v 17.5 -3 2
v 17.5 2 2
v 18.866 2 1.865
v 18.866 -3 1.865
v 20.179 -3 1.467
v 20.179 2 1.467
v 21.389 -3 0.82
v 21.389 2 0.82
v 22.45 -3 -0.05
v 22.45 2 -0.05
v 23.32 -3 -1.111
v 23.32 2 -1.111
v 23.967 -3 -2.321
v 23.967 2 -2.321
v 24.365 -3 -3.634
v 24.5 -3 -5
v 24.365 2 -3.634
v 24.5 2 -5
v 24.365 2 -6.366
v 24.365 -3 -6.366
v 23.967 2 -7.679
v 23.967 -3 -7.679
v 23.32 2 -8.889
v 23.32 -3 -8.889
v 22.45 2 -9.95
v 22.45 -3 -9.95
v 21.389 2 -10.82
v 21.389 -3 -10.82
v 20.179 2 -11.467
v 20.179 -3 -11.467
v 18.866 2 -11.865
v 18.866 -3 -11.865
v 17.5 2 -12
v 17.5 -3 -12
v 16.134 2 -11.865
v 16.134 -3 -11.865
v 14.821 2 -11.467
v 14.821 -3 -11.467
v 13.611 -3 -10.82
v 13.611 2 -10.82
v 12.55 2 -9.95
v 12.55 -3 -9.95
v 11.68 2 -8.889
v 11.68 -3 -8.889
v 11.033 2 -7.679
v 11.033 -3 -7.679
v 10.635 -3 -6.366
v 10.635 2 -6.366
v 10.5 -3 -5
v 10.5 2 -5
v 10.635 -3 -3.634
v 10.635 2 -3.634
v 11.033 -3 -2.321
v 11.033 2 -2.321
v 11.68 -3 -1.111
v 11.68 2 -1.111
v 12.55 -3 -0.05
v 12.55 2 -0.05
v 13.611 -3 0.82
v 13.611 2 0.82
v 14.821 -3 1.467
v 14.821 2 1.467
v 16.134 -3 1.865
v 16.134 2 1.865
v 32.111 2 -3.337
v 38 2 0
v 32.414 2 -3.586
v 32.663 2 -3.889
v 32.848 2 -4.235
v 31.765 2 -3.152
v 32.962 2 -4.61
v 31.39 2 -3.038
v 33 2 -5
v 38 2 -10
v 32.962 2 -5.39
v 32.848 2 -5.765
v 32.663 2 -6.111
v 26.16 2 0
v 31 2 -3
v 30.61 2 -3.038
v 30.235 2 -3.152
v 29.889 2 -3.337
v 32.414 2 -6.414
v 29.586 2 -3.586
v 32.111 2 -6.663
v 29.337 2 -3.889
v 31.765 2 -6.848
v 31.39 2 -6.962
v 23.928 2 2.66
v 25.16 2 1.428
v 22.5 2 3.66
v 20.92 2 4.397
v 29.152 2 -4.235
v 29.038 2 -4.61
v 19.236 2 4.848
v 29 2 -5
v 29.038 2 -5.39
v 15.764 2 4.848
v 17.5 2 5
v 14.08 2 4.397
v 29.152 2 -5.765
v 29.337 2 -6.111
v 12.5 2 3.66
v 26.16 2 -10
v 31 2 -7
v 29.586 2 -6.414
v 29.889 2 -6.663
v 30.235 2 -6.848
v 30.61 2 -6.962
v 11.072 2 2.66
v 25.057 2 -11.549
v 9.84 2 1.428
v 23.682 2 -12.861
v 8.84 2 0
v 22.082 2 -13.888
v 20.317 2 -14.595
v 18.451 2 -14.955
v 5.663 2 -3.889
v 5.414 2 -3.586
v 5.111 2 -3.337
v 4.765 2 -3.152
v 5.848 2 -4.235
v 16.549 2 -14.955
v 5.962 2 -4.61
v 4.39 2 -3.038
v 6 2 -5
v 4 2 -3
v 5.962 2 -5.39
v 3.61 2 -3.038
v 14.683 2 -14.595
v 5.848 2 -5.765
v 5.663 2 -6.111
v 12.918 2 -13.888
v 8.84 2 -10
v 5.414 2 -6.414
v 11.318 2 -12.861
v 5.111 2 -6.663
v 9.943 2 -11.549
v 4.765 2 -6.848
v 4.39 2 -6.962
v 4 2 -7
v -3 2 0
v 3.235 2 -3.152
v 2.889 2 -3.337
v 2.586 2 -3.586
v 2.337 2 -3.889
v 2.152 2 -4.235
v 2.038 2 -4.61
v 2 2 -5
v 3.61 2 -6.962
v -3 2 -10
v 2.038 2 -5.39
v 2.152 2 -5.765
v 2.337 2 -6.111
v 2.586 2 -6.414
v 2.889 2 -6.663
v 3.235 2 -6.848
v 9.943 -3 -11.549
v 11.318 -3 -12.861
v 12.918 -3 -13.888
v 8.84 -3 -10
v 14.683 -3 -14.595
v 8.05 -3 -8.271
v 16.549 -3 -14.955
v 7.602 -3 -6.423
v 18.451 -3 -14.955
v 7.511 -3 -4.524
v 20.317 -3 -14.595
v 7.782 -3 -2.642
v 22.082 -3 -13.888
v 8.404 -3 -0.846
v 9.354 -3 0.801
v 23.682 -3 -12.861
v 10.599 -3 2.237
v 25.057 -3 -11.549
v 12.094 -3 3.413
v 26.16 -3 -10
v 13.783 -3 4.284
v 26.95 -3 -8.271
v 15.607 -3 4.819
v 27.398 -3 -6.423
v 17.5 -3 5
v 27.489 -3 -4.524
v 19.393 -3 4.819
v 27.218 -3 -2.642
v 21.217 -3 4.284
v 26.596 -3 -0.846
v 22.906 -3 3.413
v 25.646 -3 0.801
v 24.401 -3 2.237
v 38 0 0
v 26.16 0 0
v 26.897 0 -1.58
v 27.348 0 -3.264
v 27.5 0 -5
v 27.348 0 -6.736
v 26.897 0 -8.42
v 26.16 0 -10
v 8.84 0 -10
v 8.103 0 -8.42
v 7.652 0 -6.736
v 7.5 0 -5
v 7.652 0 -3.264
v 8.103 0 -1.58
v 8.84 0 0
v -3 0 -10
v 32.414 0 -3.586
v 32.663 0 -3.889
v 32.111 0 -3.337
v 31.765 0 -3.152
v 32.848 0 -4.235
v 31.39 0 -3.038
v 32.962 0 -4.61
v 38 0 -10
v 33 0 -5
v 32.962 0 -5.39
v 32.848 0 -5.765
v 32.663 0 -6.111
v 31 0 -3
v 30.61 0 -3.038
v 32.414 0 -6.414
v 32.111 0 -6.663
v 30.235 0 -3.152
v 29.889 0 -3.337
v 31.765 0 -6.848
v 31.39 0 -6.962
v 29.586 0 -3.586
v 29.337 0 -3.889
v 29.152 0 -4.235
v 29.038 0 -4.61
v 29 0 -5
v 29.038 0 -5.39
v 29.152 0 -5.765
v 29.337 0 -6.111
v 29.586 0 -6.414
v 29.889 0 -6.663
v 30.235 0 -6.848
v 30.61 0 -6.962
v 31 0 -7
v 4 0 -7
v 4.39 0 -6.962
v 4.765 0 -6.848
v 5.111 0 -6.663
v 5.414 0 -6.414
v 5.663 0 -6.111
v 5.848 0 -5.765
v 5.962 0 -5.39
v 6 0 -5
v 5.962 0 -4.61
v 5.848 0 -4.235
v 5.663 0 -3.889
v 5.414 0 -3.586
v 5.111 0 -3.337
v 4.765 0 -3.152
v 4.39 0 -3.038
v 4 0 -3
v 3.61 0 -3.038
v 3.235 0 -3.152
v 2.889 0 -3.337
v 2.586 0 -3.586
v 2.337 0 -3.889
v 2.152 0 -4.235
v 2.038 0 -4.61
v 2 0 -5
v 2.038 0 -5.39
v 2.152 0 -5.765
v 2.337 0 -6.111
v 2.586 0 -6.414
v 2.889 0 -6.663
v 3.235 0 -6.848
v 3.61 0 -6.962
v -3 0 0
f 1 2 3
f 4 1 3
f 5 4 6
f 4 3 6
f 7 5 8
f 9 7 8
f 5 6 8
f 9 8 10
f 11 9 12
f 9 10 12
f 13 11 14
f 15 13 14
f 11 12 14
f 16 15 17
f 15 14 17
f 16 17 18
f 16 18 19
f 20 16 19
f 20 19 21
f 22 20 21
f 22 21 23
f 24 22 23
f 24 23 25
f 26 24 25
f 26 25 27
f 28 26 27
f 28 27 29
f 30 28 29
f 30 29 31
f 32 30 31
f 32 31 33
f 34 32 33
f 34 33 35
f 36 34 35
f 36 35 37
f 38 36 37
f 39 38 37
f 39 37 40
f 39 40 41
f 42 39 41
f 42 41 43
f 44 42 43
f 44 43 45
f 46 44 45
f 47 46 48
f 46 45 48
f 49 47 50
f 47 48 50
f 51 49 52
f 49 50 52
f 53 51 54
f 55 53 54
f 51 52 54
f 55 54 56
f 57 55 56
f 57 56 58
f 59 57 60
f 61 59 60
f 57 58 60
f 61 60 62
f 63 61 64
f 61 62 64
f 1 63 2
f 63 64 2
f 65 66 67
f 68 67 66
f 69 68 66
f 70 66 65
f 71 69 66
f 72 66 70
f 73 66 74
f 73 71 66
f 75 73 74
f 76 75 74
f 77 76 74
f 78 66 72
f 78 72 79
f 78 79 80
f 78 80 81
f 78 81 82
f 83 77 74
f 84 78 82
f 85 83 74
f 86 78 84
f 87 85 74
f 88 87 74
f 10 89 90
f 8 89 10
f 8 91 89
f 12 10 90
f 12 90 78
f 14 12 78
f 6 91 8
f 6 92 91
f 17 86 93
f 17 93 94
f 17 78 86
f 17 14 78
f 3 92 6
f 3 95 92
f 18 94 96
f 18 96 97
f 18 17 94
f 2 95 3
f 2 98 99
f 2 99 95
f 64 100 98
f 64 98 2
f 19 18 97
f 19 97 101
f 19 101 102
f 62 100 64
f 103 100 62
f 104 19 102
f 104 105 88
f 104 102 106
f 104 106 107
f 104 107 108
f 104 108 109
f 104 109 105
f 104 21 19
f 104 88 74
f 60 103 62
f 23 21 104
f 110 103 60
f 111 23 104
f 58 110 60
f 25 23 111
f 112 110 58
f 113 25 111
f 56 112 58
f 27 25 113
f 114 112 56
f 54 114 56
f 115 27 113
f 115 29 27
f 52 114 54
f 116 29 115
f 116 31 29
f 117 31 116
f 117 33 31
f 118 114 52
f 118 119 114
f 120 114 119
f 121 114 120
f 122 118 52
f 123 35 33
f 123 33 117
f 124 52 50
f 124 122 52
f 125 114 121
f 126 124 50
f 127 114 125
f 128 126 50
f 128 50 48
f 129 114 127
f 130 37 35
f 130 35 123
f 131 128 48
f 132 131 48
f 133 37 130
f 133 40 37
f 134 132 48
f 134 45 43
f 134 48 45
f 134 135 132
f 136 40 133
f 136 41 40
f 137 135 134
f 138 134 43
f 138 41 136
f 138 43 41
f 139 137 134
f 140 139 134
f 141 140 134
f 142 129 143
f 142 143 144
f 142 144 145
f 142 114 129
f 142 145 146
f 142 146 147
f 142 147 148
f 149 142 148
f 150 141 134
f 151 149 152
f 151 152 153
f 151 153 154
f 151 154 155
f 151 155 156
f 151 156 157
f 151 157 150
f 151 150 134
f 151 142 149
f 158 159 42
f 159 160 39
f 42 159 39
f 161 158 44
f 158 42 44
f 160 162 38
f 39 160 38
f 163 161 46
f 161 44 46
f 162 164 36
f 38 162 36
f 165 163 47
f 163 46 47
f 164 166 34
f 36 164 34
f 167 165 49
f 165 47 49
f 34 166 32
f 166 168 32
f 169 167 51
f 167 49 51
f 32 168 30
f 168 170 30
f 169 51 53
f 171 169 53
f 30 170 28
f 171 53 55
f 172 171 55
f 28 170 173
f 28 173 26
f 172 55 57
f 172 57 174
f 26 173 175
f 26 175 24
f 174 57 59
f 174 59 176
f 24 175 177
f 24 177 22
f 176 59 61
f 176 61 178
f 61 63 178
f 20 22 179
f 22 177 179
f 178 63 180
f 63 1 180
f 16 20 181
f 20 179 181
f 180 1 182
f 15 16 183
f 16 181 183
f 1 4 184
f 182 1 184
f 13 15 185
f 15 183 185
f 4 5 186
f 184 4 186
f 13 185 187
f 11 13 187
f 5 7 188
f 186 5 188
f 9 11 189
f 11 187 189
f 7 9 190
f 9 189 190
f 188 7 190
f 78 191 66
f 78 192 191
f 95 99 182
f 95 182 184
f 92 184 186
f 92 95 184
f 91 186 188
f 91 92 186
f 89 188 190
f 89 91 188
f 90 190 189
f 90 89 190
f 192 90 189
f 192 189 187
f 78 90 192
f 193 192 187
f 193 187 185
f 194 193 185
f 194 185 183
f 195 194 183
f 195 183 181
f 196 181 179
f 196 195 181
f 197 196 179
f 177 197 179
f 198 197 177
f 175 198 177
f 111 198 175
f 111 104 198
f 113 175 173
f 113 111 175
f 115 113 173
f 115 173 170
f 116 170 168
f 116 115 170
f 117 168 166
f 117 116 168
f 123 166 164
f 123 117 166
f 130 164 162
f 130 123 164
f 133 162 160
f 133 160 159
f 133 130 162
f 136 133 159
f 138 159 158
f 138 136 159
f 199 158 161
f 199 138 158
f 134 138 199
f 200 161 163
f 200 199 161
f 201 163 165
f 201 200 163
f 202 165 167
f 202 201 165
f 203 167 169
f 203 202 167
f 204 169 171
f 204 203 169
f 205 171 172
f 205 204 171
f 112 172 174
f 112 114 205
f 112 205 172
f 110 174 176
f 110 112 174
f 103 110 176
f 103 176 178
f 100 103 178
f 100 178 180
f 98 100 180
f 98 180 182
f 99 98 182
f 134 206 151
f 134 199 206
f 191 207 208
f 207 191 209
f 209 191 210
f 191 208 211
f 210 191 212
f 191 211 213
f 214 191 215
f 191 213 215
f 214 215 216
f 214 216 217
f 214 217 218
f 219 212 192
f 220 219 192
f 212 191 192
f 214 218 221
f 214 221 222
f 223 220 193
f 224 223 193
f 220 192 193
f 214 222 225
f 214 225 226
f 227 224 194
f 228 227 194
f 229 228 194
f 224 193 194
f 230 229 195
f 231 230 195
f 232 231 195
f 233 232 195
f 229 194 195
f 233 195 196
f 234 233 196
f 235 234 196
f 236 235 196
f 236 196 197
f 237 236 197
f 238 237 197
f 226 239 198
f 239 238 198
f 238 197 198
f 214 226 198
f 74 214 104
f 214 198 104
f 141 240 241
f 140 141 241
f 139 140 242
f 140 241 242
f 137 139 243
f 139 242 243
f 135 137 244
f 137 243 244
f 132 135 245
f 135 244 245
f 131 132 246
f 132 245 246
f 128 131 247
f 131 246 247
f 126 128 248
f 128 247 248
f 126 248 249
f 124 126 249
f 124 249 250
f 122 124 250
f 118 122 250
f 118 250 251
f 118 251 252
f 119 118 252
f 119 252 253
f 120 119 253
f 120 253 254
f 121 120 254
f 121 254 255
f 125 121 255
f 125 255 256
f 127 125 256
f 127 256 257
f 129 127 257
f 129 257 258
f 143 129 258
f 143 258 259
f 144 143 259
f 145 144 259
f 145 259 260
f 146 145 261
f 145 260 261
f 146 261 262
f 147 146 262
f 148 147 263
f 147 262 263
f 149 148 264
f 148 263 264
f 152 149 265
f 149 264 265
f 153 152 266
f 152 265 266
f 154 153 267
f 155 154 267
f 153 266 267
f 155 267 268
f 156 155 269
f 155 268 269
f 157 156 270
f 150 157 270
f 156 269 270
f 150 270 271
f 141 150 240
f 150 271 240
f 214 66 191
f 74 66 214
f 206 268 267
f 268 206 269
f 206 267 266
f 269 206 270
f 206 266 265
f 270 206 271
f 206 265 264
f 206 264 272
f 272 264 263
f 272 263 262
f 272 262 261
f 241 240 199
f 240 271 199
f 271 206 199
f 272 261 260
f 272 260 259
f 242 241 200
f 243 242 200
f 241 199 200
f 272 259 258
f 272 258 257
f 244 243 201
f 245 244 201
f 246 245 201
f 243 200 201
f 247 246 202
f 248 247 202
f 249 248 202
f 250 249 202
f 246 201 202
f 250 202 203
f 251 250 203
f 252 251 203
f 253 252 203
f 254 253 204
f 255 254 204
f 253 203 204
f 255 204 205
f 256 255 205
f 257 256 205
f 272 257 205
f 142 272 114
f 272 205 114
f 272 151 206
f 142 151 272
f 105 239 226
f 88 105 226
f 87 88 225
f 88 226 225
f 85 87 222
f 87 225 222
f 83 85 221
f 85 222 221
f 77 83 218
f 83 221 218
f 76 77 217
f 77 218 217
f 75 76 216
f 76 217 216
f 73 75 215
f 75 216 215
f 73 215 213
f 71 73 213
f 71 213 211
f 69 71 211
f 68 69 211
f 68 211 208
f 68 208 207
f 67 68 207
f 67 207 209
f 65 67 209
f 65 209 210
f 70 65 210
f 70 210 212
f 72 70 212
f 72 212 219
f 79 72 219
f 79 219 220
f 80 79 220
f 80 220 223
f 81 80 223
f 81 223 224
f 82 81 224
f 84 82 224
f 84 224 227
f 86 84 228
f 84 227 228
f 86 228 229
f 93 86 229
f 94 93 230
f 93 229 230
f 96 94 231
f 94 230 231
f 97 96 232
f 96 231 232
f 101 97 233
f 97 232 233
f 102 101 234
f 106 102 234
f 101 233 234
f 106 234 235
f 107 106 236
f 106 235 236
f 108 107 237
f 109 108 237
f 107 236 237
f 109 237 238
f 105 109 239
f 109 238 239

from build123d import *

# Parameters (mm, degrees)
SKETCH1_W           = 35
SKETCH1_H           = 10
BOSS_EXTRUDE1_DEPTH = 2
SKETCH2_R           = 10
BOSS_EXTRUDE2_DEPTH = 5
SKETCH3_R           = 7
CUT_EXTRUDE1_DEPTH  = 2000
SKETCH4_R           = 2
CUT_EXTRUDE2_DEPTH  = 20
SKETCH5_W           = 10
SKETCH5_H           = 2
BOSS_EXTRUDE3_DEPTH = 3
SKETCH6_W           = 10
SKETCH6_H           = 2
BOSS_EXTRUDE4_DEPTH = 3


with BuildPart() as part:
    # Sketch1 → Boss-Extrude1 (new body)
    with BuildSketch(Plane(origin=(0, 0, 0), x_dir=(1, 0, 0), z_dir=(0, 1, 0))):
        with Locations((17.5, 5)):
            Rectangle(SKETCH1_W, SKETCH1_H)
    extrude(amount=BOSS_EXTRUDE1_DEPTH)

    # Sketch2 → Boss-Extrude2 (add)
    with BuildSketch(Plane(origin=(0, 2, 0), x_dir=(1, 0, 0), z_dir=(0, 1, 0))):
        with Locations(Location((17.5, 5, 0), (0, 0, 270))):
            Circle(SKETCH2_R)
    extrude(amount=-BOSS_EXTRUDE2_DEPTH)

    # Sketch3 → Cut-Extrude1 (cut)
    with BuildSketch(Plane(origin=(0, 2, 0), x_dir=(1, 0, 0), z_dir=(0, 1, 0))):
        with Locations(Location((17.5, 5, 0), (0, 0, 270))):
            Circle(SKETCH3_R)
    extrude(amount=-CUT_EXTRUDE1_DEPTH, mode=Mode.SUBTRACT)

    # Sketch4 → Cut-Extrude2 (cut)
    with BuildSketch(Plane.XZ):
        with Locations(Location((4, -5, 0), (0, 0, 270))):
            Circle(SKETCH4_R)
        with Locations(Location((31, -5, 0), (0, 0, 270))):
            Circle(SKETCH4_R)
    extrude(amount=-CUT_EXTRUDE2_DEPTH, mode=Mode.SUBTRACT)

    # Sketch5 → Boss-Extrude3 (add)
    with BuildSketch(Plane.ZY):
        with Locations((-5, 1)):
            Rectangle(SKETCH5_W, SKETCH5_H)
    extrude(amount=BOSS_EXTRUDE3_DEPTH)

    # Sketch6 → Boss-Extrude4 (add)
    with BuildSketch(Plane(origin=(35, 0, 0), x_dir=(0, 0, -1), z_dir=(1, 0, 0))):
        with Locations((5, 1)):
            Rectangle(SKETCH6_W, SKETCH6_H)
    extrude(amount=BOSS_EXTRUDE4_DEPTH)


solid = part.part
